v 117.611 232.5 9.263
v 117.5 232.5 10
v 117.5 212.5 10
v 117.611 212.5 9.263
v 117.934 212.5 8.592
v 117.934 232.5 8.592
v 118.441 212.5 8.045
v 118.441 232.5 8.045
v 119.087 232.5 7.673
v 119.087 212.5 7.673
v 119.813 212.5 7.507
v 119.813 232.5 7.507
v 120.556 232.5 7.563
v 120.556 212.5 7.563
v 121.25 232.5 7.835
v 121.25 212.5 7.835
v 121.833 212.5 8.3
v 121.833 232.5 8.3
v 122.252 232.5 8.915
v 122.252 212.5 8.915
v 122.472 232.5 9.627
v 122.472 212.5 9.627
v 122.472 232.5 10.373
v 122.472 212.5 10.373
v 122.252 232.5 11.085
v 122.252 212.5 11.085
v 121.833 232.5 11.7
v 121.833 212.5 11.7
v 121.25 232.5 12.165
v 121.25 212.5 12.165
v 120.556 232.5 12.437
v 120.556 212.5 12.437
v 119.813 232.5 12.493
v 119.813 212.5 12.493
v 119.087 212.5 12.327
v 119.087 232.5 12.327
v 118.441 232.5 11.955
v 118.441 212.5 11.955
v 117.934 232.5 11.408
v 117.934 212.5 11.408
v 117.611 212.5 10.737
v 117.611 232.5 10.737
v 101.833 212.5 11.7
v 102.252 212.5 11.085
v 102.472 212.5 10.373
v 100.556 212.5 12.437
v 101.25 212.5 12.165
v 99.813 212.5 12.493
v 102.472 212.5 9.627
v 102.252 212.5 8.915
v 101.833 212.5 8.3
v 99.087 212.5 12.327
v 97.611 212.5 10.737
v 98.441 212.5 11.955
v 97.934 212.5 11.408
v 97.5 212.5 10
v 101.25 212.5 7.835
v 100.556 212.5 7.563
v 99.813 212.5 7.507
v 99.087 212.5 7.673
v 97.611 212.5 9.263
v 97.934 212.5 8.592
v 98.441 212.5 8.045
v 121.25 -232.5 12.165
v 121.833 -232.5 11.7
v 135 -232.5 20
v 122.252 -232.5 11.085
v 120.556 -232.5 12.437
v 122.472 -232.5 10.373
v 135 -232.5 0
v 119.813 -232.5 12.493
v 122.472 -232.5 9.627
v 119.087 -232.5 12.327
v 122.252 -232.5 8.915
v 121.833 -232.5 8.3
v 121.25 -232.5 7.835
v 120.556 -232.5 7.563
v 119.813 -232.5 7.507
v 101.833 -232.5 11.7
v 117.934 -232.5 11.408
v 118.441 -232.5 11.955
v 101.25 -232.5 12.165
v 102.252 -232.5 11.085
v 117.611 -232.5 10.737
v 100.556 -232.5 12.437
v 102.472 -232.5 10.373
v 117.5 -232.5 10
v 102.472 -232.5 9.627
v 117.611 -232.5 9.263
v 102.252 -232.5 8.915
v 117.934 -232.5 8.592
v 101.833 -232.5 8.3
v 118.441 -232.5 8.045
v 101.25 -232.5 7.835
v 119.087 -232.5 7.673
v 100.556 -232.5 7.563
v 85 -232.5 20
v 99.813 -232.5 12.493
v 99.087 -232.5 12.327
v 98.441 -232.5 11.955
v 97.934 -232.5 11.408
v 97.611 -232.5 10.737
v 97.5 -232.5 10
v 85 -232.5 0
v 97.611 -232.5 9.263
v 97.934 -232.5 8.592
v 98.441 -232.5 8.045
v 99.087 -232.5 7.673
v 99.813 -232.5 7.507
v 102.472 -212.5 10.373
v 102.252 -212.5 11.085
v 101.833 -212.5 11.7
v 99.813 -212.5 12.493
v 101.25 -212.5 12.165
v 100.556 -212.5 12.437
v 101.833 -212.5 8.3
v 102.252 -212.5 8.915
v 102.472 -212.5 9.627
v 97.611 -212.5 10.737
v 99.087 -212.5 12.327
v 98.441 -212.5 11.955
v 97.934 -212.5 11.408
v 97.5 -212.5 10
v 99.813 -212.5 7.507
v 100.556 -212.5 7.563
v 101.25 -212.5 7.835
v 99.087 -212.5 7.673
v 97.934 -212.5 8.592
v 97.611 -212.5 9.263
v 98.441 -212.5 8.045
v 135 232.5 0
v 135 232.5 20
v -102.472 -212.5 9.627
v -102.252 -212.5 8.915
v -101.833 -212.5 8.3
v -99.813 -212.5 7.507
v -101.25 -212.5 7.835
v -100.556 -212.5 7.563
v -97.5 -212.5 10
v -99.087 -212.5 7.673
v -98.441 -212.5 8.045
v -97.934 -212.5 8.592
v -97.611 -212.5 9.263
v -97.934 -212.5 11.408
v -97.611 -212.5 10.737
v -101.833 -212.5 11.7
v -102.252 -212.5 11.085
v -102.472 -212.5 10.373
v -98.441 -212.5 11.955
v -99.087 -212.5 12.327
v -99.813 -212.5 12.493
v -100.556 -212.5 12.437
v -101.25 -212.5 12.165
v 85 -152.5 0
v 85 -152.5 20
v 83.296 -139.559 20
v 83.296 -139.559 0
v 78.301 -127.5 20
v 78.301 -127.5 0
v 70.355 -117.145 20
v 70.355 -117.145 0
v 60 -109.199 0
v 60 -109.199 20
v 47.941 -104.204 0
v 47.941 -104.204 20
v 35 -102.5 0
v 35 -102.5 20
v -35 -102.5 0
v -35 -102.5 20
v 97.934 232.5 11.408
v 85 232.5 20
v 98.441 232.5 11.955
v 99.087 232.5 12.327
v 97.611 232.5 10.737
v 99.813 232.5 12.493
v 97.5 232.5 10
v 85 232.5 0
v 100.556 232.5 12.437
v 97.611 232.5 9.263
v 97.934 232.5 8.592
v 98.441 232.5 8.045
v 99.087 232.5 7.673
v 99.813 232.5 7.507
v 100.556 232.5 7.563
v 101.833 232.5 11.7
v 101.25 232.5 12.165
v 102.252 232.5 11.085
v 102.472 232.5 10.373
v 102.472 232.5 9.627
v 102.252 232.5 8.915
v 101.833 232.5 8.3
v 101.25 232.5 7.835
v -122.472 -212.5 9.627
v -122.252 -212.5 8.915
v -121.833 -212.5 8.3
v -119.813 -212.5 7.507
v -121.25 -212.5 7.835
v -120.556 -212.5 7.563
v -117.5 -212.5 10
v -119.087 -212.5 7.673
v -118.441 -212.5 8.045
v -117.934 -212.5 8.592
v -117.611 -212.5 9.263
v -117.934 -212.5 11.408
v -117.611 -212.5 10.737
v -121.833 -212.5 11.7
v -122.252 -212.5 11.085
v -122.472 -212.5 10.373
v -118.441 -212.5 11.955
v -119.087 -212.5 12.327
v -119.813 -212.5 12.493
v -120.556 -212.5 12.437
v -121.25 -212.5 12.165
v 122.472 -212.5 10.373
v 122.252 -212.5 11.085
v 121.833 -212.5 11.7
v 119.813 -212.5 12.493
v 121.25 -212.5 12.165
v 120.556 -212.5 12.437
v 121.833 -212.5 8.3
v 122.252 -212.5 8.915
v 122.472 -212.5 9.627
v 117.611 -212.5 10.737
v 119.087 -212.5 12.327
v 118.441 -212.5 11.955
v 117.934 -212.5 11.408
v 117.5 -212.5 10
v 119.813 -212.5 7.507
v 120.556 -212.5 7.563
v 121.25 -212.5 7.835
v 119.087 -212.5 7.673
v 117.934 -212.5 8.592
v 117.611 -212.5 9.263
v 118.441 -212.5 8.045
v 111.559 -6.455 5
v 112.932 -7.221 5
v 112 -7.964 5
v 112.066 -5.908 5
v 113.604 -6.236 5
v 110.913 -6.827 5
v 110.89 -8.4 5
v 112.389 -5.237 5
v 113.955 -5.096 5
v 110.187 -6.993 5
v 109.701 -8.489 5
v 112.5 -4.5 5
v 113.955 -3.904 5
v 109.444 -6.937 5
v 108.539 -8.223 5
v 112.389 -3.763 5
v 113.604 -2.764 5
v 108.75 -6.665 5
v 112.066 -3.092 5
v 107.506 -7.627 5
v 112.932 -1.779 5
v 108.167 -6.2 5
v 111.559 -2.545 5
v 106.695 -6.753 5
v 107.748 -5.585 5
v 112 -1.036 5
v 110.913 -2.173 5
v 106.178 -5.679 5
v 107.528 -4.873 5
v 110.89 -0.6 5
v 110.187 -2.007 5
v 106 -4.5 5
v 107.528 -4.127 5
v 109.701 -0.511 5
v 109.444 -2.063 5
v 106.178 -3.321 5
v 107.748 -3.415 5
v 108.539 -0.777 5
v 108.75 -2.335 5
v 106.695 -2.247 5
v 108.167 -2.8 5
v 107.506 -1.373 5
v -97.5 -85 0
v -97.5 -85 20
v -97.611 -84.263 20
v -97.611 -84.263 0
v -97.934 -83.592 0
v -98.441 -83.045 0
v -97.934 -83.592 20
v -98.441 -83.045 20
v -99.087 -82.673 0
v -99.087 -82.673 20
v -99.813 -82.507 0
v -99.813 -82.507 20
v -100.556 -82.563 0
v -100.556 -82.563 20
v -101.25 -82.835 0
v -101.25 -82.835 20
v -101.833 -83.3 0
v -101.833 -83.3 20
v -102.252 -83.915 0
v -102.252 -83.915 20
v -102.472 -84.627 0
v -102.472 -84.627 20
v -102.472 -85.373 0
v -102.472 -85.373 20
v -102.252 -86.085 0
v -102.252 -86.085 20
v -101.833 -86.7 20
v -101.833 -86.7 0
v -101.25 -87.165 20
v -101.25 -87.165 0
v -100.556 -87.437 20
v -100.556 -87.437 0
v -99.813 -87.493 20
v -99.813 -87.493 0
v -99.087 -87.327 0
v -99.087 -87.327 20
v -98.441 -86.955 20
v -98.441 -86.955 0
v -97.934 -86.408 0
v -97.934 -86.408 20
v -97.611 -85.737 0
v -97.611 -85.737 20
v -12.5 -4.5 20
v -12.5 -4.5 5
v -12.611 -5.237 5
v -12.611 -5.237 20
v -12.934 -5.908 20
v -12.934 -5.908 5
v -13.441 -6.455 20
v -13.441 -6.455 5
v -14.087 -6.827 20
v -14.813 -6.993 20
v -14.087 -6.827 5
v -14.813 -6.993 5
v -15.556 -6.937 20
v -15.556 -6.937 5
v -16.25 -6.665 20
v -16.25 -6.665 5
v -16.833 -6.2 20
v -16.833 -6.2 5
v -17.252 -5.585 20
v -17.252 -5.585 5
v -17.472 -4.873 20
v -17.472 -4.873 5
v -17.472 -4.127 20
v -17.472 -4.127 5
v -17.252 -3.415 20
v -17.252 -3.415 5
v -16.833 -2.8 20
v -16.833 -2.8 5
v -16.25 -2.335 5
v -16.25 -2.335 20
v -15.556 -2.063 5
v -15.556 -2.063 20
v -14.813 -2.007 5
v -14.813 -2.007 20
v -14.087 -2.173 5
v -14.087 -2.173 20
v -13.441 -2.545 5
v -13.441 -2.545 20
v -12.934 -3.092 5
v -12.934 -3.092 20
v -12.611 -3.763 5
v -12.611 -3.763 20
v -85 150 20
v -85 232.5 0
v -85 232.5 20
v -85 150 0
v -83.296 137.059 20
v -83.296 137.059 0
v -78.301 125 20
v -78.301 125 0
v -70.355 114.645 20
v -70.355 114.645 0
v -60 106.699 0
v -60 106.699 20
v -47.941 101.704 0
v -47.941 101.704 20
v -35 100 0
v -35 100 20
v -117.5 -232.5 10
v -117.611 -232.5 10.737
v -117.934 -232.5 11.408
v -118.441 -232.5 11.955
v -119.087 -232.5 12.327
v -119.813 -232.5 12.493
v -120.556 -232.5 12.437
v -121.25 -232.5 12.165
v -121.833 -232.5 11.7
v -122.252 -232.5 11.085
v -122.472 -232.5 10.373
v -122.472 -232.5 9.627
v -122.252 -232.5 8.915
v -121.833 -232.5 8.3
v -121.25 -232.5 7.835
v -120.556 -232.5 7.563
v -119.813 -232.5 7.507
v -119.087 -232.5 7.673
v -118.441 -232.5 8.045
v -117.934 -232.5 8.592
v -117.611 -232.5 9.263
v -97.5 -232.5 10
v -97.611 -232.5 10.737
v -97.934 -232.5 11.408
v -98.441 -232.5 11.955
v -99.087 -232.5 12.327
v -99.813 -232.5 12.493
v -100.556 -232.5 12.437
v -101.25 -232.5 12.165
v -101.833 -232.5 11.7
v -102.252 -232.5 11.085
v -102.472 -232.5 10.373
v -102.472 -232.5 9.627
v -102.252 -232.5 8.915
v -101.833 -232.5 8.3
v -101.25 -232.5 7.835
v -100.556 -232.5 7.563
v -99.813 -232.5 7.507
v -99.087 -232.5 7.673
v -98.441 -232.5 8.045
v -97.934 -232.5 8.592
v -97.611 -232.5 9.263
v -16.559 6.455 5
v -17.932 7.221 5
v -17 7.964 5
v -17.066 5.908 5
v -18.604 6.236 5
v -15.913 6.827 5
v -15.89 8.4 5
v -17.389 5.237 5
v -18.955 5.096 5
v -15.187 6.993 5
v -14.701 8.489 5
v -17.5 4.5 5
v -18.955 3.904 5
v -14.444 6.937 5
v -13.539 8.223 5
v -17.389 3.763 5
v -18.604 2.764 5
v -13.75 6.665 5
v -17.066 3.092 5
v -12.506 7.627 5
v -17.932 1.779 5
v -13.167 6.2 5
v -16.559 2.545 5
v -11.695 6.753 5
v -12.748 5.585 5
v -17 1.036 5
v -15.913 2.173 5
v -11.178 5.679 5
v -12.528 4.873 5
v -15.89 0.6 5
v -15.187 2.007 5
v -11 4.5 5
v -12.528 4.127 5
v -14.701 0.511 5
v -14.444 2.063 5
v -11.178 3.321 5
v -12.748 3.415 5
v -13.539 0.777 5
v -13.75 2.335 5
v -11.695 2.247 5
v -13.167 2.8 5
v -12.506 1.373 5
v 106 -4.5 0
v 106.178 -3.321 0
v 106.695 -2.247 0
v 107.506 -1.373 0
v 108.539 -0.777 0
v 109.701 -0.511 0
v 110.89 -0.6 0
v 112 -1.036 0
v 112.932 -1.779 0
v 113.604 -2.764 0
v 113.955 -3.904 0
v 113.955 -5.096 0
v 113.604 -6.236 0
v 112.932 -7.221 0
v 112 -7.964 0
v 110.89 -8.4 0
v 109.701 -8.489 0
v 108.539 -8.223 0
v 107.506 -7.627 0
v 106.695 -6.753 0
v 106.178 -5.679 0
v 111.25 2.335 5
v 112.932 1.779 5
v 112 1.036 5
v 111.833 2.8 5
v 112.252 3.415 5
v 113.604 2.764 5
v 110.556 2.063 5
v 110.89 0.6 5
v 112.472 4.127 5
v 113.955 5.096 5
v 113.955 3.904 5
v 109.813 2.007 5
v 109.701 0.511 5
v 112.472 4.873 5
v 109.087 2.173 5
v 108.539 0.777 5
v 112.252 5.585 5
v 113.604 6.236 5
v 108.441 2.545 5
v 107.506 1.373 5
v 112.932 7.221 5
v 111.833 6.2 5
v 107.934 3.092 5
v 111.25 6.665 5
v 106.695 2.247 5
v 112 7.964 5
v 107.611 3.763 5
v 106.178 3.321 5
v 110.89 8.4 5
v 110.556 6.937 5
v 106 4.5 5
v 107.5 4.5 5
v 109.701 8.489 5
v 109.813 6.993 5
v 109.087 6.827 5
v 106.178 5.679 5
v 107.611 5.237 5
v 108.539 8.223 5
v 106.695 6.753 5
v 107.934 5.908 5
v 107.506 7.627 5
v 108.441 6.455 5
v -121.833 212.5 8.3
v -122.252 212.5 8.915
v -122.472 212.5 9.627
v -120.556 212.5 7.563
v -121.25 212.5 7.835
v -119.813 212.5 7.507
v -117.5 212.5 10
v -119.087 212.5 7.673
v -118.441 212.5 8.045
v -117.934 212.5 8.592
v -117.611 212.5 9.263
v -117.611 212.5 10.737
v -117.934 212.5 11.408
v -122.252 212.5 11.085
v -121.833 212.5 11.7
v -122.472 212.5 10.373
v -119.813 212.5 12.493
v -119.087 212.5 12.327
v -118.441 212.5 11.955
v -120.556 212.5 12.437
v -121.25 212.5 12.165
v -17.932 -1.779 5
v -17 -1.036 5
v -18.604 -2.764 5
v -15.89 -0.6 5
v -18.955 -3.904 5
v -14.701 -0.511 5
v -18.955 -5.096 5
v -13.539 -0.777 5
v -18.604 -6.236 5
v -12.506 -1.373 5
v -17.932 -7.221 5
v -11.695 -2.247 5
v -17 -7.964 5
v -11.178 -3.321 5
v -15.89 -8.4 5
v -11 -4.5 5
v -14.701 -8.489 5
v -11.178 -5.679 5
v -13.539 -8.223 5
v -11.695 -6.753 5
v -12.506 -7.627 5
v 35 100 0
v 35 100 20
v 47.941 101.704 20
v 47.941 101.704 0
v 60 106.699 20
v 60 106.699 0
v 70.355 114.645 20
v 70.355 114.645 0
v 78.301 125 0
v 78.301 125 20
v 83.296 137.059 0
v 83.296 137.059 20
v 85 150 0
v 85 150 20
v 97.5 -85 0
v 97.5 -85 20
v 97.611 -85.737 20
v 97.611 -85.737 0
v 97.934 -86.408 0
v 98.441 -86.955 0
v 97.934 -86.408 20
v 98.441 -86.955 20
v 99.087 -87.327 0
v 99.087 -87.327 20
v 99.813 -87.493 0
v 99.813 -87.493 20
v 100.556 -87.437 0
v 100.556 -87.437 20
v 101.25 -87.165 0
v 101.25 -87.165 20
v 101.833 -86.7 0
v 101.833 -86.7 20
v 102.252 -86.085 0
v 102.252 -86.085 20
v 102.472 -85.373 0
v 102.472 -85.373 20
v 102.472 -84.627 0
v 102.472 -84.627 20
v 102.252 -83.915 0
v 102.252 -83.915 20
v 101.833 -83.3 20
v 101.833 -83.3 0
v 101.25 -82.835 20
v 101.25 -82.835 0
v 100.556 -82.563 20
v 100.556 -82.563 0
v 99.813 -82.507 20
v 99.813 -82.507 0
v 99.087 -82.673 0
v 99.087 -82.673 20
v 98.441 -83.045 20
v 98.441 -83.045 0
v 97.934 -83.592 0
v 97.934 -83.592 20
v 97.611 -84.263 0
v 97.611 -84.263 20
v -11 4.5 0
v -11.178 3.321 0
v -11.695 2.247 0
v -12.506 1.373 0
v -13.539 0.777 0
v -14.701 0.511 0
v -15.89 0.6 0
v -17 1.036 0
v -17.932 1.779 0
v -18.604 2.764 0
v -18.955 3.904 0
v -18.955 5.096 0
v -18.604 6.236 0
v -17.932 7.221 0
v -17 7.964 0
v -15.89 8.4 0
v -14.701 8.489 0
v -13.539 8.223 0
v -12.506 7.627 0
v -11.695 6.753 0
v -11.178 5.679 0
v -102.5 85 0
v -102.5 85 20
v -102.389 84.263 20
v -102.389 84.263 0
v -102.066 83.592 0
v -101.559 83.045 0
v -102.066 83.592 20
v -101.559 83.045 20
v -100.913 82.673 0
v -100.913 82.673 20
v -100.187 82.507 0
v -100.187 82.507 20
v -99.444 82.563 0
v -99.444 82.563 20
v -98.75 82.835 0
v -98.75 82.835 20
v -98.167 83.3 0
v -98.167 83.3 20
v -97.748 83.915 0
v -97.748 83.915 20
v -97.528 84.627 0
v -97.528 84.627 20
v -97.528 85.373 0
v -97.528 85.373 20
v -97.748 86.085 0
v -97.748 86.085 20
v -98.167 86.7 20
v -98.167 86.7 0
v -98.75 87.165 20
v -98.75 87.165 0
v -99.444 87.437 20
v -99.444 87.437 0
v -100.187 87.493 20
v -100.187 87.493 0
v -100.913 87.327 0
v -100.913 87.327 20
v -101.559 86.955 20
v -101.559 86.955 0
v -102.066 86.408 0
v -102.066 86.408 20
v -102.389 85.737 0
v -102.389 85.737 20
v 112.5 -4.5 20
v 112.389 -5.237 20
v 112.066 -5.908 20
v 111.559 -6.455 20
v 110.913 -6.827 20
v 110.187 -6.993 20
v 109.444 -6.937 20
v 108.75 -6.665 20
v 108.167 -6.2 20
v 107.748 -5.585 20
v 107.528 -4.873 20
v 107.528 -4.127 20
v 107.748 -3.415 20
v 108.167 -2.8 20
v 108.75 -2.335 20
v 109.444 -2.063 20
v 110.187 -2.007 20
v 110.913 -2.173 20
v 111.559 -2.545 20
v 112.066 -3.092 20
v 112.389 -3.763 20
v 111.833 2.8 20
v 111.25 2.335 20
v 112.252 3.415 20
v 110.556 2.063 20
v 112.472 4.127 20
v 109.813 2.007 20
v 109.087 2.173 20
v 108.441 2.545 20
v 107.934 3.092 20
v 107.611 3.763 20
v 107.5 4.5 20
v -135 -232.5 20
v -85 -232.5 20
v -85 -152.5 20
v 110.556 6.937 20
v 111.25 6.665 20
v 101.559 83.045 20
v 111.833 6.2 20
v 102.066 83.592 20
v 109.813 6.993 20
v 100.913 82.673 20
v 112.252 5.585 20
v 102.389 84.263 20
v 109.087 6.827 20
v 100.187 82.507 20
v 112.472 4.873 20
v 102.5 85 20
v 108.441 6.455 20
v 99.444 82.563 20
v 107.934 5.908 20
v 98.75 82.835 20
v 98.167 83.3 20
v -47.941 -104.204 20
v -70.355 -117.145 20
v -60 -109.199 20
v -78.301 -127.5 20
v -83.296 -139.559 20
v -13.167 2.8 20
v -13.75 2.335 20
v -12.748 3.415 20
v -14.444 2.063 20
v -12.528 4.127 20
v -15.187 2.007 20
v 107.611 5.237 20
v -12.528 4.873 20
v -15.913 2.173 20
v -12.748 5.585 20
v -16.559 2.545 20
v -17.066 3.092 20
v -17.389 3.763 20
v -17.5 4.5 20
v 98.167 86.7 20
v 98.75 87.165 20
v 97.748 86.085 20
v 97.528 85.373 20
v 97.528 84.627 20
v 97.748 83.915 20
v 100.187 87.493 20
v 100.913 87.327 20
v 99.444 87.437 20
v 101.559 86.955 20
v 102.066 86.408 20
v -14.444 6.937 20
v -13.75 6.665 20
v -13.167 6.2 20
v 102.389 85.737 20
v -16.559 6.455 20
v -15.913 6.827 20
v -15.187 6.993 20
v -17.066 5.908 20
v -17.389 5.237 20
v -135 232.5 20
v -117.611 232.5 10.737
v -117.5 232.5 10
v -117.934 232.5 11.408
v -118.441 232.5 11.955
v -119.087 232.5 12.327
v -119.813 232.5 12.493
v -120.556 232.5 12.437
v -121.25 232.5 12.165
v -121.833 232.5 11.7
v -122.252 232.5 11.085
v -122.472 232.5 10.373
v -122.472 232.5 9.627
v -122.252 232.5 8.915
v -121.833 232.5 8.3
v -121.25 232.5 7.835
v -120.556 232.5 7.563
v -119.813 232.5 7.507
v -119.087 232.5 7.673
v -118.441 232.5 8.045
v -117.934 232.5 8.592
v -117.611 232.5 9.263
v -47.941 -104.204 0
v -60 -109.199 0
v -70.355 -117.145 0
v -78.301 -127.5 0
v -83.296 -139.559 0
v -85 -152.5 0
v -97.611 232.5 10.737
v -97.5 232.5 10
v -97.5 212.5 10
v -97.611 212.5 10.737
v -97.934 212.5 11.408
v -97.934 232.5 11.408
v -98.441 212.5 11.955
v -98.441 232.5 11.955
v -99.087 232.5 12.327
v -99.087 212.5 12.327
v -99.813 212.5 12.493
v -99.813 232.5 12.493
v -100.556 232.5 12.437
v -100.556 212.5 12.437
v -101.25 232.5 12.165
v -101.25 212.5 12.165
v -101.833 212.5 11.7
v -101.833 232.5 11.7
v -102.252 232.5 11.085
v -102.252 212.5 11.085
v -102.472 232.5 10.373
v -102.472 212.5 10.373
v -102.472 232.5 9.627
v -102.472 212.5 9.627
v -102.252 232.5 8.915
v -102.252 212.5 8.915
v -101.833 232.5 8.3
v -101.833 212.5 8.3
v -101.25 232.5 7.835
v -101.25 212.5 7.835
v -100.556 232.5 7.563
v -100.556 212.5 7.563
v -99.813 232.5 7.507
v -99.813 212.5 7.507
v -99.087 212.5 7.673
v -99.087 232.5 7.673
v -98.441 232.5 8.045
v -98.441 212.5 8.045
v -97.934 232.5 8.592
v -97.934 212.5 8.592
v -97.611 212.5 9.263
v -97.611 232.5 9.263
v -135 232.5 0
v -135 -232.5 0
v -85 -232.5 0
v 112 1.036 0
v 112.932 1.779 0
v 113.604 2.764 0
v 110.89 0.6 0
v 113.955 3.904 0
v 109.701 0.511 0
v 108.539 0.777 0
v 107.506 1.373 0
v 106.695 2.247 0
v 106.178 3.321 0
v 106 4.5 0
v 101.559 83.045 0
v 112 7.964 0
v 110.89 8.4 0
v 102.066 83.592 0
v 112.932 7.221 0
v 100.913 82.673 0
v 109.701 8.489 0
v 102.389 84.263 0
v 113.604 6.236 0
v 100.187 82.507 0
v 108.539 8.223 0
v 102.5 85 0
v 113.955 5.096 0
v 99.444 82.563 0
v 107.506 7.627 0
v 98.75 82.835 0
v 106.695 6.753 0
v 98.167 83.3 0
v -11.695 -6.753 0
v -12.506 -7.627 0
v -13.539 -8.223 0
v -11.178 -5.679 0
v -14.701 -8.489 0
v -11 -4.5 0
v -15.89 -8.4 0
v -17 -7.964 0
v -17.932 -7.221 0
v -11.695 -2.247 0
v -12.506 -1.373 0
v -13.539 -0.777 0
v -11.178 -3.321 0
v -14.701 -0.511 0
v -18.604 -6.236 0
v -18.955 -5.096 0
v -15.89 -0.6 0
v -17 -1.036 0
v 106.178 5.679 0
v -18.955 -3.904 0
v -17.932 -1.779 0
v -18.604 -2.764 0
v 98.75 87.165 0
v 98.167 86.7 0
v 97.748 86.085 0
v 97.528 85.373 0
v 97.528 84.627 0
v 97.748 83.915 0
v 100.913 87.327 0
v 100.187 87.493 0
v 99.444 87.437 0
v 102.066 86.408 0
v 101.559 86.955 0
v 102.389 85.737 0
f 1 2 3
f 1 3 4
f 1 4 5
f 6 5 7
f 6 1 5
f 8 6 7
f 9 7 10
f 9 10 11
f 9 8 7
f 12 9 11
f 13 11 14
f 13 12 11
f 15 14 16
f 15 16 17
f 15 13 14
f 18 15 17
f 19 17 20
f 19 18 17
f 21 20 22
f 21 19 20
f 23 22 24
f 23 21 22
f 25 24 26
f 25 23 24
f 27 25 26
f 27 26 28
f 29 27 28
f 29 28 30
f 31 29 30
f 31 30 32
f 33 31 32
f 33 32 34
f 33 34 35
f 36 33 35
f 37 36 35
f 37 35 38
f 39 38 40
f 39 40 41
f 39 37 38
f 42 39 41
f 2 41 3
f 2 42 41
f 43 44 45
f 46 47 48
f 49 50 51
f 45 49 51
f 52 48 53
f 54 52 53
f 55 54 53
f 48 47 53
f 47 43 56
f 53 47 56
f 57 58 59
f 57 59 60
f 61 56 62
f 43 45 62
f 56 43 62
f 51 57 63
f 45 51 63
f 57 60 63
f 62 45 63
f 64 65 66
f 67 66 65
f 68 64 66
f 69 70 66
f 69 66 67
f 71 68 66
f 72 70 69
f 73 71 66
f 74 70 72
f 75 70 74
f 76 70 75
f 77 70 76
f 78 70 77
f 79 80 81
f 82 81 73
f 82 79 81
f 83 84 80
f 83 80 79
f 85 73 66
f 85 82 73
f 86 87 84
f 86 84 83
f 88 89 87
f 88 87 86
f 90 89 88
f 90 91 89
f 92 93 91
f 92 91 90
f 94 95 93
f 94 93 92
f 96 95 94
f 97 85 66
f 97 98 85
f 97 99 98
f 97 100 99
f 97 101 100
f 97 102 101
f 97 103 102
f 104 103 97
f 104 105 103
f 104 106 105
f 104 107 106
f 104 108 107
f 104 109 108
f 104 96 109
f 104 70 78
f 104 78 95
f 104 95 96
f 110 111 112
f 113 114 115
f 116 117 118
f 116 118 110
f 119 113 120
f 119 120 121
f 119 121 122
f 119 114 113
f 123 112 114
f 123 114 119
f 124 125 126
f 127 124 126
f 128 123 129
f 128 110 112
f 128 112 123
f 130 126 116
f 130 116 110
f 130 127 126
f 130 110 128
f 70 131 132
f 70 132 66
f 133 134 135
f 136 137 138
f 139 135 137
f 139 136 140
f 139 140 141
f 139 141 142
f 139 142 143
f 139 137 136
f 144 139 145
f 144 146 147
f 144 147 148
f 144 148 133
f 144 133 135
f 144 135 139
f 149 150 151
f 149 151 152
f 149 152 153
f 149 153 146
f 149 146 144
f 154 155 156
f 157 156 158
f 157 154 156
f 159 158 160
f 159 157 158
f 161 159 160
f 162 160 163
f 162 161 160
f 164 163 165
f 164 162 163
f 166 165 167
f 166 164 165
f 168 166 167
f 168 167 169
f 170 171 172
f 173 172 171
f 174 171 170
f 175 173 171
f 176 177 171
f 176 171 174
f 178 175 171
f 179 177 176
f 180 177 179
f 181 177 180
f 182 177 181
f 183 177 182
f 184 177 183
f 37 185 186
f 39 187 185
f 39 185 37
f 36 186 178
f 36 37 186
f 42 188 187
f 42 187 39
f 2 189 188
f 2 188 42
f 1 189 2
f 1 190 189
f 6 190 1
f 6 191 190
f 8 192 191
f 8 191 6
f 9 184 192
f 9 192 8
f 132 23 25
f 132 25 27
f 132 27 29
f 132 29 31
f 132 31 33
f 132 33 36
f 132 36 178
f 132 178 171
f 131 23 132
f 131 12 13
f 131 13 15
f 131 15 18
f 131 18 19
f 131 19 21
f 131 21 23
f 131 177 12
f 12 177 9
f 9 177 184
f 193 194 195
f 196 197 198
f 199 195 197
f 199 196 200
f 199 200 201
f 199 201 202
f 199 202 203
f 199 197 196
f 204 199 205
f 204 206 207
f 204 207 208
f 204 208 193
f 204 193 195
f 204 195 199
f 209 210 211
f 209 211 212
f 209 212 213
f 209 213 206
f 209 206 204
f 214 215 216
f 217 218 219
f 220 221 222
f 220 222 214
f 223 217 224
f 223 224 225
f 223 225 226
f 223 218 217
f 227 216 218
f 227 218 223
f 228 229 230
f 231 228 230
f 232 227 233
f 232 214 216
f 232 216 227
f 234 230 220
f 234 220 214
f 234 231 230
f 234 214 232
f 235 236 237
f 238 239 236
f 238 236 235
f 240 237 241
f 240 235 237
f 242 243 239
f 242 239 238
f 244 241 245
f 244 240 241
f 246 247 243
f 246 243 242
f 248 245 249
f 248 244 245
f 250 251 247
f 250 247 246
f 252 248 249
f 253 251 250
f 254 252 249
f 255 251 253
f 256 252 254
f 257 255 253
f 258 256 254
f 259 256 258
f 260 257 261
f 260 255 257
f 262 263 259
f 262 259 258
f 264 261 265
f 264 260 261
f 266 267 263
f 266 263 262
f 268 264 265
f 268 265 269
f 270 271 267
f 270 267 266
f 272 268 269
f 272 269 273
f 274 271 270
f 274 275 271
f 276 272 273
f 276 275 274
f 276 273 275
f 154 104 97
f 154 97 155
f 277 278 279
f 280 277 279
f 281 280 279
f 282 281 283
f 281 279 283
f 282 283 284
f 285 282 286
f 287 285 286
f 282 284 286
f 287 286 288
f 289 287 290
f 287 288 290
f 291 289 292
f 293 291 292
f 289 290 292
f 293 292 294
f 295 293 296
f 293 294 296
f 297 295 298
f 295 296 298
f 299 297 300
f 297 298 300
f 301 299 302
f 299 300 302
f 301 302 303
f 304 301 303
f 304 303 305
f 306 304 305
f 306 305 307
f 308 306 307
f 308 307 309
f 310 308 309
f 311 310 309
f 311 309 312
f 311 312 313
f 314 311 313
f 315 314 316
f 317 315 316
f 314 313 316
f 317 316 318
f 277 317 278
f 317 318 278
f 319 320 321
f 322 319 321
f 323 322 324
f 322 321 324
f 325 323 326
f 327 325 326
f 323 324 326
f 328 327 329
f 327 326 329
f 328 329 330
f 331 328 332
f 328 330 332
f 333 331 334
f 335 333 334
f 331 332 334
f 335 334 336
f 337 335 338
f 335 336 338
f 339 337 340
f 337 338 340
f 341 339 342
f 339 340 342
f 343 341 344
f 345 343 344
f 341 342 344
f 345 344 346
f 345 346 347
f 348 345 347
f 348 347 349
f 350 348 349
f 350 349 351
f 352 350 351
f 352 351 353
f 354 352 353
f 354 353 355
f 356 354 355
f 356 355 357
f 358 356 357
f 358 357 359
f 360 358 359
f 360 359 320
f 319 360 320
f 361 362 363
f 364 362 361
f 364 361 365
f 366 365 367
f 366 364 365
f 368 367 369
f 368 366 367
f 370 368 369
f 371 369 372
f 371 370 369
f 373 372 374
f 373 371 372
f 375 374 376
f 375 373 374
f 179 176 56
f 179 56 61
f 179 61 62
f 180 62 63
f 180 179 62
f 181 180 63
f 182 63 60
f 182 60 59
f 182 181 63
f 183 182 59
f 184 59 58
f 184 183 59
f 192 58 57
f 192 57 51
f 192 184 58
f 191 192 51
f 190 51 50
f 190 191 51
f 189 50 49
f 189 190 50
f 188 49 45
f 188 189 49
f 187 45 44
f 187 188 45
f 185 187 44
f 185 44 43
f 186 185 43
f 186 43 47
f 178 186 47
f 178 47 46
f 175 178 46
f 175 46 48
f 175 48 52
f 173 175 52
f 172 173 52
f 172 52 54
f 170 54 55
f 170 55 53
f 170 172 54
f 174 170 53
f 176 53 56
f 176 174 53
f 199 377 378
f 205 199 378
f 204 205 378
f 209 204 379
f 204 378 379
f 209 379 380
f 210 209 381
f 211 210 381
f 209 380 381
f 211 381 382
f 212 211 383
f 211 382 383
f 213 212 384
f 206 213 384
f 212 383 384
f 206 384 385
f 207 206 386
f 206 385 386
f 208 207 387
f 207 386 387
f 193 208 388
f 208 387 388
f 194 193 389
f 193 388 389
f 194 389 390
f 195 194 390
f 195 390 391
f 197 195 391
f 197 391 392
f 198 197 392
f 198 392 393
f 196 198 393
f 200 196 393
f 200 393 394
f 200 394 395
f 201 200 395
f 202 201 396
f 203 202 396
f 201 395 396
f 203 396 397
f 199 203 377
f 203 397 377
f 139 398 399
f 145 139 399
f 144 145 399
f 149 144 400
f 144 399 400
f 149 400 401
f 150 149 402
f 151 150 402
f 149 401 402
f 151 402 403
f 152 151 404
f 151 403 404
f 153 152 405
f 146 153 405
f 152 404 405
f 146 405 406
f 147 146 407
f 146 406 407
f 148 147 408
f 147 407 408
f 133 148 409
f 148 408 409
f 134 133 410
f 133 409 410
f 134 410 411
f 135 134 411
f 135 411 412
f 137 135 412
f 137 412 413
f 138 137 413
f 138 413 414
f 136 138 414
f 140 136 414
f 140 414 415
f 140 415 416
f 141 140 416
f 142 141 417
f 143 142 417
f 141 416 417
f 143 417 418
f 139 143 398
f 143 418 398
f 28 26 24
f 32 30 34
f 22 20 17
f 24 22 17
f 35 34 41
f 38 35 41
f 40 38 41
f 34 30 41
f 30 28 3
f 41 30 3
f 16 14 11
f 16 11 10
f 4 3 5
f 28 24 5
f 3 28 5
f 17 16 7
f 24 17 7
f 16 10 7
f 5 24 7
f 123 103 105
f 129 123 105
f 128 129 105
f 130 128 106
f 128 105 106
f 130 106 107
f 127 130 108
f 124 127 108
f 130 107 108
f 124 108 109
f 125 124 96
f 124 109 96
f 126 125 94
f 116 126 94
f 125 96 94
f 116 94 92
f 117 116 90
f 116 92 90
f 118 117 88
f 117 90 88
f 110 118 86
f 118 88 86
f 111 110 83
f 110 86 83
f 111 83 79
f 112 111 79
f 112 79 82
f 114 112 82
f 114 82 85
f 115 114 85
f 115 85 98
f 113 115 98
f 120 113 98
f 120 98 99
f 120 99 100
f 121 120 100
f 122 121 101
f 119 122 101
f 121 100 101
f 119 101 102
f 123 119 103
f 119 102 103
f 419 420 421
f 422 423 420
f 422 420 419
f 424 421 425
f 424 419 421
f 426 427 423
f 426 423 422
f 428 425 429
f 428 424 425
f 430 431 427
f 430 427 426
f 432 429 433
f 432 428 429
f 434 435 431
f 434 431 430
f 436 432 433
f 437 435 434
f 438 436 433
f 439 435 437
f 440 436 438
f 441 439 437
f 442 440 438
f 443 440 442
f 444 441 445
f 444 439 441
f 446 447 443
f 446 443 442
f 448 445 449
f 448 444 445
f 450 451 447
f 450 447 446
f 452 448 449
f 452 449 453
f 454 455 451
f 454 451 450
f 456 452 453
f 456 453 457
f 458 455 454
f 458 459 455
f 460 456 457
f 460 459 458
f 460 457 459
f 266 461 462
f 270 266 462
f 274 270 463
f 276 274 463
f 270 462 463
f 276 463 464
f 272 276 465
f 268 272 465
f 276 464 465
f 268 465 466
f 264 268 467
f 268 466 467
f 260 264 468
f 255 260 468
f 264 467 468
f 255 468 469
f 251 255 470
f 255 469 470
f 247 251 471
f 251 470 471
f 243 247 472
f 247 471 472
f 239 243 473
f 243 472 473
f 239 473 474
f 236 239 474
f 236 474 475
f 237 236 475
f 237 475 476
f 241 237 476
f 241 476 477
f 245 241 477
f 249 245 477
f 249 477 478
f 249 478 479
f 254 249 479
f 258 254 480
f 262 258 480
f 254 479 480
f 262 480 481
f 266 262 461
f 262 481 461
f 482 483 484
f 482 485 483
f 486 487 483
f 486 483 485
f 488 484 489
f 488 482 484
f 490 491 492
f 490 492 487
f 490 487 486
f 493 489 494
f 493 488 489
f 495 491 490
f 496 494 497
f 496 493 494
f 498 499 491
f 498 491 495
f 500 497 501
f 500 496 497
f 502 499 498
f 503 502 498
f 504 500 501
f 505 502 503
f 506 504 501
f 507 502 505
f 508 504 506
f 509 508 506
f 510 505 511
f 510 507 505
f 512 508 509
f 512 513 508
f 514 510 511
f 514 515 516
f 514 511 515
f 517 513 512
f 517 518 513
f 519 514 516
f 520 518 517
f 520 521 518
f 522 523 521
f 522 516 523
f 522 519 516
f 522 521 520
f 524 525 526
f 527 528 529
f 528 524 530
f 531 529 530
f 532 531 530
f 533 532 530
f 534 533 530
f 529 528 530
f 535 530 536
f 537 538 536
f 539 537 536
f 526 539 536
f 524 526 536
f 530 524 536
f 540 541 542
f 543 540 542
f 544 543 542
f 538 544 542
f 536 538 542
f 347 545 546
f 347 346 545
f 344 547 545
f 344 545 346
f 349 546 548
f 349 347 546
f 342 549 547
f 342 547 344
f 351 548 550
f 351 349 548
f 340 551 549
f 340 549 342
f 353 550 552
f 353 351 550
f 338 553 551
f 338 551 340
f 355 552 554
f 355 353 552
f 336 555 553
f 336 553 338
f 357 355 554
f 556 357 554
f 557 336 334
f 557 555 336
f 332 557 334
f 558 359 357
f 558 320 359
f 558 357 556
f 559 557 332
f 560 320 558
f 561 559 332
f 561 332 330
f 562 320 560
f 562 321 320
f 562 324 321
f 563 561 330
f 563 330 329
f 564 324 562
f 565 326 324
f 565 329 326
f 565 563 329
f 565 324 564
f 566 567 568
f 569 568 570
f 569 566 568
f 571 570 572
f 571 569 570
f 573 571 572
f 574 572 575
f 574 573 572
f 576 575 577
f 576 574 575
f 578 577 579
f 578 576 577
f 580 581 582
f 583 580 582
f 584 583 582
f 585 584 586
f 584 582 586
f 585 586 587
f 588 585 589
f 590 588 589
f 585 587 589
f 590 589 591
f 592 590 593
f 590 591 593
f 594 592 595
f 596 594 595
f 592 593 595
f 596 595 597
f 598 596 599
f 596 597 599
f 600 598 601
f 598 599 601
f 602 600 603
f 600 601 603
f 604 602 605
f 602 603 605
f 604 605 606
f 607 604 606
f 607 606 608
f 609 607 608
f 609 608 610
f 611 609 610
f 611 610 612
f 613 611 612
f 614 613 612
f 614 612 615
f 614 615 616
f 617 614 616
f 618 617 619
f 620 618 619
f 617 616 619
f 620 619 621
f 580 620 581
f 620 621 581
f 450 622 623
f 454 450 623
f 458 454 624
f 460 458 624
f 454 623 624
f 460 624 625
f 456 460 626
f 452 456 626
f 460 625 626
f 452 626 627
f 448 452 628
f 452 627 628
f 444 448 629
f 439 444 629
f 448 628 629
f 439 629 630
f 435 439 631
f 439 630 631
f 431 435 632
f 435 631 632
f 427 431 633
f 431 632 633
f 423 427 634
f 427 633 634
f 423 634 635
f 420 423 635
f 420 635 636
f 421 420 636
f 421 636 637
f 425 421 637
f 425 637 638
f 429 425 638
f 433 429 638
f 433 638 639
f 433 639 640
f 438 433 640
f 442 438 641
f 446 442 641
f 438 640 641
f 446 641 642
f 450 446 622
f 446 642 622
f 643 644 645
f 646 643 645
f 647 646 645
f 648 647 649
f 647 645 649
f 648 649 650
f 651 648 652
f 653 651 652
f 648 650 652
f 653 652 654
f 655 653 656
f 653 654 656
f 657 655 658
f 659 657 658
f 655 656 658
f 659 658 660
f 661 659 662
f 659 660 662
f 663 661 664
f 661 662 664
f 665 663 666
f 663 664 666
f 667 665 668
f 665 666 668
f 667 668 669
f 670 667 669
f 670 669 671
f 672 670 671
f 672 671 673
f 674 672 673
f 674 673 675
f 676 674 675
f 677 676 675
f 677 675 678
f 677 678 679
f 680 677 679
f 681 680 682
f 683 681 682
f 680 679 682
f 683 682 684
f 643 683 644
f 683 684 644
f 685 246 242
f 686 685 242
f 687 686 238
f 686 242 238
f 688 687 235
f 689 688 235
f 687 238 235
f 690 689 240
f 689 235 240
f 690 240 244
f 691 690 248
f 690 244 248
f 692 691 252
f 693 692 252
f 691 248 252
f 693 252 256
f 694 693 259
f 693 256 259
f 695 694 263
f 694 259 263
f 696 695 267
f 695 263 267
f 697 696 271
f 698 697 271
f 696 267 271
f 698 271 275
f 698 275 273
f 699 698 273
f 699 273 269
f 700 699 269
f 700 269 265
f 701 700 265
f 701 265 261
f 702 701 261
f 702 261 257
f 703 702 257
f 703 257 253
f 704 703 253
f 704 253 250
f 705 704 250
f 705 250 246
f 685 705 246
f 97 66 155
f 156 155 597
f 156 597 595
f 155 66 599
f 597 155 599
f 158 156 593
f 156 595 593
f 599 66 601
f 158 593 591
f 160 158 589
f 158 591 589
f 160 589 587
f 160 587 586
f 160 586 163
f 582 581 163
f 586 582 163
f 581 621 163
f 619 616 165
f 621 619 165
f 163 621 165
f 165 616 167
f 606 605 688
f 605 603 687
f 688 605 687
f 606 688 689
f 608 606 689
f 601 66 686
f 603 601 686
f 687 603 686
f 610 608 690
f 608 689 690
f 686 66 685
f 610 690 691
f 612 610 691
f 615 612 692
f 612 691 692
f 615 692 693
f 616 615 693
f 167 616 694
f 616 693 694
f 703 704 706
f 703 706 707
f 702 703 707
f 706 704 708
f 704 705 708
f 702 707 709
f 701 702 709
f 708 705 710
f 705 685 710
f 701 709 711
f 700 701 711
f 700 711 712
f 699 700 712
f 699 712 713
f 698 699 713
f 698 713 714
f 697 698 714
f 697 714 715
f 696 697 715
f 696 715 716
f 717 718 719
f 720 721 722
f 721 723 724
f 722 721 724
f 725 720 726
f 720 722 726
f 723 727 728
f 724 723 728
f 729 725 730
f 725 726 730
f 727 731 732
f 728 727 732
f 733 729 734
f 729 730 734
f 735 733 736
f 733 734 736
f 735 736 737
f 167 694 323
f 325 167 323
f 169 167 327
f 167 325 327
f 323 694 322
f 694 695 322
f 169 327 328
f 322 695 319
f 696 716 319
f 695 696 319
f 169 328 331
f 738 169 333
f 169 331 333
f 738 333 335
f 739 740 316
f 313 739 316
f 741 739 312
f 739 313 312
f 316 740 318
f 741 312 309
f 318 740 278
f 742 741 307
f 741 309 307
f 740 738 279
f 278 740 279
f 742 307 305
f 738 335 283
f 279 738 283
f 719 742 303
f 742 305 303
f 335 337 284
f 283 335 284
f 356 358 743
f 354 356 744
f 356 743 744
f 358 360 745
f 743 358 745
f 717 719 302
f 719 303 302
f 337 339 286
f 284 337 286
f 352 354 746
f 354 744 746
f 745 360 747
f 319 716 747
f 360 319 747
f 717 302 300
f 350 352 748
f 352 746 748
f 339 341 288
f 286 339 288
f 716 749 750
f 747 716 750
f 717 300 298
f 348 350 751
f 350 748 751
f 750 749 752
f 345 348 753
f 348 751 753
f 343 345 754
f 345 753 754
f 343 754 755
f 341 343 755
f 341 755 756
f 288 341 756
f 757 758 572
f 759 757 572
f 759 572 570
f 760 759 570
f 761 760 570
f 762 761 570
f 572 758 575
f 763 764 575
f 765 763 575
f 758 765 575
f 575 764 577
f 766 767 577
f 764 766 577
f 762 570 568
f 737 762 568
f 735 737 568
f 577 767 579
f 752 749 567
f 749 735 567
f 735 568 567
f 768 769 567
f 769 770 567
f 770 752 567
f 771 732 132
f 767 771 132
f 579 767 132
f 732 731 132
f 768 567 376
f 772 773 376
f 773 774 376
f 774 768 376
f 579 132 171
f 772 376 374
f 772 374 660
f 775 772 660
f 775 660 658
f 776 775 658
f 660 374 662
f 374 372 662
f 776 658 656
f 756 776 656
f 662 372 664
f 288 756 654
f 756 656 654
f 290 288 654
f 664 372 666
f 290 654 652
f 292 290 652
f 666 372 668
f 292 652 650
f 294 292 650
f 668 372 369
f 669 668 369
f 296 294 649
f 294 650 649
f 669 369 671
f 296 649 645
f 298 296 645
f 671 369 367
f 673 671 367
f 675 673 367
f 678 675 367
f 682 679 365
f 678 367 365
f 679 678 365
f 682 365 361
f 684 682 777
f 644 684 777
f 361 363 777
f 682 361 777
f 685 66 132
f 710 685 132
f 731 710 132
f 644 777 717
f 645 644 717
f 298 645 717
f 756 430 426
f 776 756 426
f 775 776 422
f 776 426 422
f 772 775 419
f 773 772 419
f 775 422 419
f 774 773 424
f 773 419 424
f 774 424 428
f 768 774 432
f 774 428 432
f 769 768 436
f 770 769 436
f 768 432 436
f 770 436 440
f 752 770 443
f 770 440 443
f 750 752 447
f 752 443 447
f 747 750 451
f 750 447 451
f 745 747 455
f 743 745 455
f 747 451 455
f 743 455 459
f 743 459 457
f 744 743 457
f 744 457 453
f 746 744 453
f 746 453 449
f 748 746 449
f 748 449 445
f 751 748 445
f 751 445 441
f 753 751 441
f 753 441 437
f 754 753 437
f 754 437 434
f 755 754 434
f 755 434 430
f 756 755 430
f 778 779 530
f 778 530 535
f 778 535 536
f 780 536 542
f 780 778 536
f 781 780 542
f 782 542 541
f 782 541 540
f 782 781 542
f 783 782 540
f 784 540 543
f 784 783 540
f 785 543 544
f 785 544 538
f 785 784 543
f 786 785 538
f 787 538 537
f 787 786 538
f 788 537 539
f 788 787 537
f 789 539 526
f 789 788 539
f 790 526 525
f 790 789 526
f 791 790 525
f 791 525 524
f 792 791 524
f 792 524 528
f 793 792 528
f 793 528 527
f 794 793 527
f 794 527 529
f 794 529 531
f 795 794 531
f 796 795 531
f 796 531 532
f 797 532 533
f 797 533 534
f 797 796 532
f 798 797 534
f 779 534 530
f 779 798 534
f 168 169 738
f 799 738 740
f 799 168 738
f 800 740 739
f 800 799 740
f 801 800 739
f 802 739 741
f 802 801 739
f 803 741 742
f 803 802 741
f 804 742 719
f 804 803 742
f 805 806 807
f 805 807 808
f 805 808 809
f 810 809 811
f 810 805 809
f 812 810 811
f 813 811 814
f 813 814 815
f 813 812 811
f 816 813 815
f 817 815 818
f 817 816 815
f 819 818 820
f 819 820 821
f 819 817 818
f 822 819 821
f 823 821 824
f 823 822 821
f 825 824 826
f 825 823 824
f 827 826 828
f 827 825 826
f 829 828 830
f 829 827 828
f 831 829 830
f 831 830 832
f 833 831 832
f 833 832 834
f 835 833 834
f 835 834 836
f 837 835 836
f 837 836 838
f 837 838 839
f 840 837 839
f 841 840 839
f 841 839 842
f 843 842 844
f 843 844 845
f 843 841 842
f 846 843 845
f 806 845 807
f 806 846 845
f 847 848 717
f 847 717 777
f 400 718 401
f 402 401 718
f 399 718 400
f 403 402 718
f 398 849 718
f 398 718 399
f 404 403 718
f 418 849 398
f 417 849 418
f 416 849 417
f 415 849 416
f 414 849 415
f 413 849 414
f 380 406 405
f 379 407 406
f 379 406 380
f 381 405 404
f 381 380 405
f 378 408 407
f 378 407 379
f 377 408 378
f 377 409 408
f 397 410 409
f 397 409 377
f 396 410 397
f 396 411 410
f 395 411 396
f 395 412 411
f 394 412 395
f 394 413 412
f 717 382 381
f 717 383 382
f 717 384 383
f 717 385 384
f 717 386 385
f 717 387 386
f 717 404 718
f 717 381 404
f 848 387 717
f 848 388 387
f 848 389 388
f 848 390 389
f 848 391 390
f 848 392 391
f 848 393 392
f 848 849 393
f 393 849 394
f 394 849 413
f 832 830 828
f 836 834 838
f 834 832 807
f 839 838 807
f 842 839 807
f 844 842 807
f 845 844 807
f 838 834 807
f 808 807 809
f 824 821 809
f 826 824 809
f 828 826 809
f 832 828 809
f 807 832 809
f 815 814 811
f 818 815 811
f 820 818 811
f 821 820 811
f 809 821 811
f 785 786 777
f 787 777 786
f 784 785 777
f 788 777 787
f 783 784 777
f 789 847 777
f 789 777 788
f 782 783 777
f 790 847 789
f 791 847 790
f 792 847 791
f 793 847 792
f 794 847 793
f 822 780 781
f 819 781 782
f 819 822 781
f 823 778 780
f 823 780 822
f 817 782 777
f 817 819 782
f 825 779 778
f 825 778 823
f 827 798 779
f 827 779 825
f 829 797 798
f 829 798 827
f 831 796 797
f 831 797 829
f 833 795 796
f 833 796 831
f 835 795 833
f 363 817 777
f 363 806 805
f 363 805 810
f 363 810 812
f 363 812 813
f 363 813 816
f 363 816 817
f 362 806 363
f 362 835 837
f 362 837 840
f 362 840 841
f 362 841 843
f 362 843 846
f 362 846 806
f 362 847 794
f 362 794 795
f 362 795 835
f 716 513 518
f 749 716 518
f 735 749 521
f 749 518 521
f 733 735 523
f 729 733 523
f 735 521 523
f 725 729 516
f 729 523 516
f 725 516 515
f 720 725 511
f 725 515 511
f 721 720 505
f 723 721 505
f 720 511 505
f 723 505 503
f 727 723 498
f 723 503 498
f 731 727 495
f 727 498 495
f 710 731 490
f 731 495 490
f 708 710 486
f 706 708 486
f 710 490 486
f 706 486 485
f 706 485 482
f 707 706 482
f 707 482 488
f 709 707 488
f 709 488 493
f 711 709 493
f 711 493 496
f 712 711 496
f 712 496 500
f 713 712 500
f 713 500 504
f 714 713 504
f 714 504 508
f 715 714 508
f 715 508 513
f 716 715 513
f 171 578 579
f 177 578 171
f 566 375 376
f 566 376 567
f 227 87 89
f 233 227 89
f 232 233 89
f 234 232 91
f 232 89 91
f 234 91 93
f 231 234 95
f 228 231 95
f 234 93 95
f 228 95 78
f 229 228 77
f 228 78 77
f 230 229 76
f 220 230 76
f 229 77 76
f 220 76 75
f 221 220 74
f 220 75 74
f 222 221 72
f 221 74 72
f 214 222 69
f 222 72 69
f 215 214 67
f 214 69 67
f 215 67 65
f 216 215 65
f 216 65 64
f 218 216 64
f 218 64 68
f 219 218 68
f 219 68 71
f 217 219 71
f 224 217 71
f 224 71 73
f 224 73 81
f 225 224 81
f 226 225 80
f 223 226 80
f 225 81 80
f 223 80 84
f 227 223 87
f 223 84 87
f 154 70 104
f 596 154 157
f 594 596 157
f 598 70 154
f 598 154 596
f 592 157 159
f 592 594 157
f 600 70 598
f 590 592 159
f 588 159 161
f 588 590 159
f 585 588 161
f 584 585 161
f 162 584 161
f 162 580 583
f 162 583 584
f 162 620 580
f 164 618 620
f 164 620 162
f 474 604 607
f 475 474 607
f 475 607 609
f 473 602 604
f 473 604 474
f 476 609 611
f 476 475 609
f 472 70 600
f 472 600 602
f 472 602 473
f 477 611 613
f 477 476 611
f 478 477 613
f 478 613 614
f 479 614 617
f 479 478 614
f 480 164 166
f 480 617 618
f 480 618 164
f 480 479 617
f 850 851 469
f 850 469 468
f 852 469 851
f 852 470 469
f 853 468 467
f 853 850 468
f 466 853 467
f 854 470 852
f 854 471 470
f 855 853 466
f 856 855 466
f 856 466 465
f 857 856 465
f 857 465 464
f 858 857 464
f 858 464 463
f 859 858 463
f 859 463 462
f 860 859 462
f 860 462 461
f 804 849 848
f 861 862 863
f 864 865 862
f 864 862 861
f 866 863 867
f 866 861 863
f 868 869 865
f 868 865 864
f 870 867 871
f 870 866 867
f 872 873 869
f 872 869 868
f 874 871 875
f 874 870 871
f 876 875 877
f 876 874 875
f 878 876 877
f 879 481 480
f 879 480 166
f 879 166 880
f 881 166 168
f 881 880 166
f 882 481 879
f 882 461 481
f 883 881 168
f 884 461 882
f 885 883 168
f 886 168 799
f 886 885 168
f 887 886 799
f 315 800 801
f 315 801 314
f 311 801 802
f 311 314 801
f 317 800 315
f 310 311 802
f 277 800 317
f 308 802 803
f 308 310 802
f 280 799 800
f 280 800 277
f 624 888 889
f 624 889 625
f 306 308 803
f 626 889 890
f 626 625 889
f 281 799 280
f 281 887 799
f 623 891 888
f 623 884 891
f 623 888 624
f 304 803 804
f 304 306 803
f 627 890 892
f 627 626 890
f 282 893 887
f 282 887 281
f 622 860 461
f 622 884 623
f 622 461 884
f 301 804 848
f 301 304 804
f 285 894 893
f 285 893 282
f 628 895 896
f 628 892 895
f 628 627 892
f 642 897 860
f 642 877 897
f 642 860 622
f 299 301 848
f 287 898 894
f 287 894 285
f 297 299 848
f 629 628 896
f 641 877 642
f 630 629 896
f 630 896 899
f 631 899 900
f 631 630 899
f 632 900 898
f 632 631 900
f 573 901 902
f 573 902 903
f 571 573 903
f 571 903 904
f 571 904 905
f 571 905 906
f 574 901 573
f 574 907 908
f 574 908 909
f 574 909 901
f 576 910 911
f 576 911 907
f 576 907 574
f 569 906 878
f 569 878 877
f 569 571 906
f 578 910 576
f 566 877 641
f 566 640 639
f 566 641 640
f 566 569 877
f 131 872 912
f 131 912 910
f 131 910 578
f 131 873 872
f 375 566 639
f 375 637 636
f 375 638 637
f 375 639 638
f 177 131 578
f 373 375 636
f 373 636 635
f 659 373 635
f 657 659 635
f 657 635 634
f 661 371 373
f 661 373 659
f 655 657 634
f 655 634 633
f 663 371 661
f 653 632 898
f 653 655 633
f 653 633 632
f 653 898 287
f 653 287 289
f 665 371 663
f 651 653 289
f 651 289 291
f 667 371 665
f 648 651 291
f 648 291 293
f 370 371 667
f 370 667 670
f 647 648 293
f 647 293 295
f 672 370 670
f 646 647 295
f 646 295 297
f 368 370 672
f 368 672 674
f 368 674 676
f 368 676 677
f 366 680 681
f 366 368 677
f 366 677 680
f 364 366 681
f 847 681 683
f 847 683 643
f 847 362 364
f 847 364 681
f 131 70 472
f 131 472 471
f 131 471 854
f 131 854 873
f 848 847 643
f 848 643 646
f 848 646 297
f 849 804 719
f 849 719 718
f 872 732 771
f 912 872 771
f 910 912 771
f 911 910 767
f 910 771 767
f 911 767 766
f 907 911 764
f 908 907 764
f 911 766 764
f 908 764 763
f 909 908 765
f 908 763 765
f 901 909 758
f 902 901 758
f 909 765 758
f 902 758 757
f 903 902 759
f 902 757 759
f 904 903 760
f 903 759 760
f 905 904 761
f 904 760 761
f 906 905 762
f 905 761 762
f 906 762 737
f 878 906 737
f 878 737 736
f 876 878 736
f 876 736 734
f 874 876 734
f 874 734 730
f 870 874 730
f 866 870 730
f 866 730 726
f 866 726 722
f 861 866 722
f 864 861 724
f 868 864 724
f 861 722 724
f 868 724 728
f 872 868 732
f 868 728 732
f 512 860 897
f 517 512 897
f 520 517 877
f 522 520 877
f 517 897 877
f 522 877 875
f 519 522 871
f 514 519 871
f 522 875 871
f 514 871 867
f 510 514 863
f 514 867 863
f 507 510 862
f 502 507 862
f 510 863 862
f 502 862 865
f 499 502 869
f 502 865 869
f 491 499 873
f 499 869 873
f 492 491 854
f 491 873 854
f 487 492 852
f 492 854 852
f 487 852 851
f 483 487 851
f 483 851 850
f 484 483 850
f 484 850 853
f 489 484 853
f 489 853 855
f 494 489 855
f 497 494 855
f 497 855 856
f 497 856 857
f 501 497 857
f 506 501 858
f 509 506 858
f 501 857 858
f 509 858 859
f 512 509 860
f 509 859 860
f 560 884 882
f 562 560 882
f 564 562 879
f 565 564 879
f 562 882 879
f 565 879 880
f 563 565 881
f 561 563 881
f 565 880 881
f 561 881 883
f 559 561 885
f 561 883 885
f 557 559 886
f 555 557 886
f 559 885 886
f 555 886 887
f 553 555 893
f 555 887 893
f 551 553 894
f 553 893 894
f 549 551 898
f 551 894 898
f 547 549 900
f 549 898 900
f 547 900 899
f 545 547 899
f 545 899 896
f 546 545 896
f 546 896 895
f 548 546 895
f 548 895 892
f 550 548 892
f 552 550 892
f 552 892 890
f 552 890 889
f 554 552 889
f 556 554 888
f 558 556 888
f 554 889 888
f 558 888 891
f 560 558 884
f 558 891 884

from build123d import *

# Parameters (mm, degrees)
BOSS_EXTRUDE1_DEPTH = 20
SKETCH2_R           = 2.5
CUT_EXTRUDE1_DEPTH  = 20
SKETCH3_R           = 2.5
CUT_EXTRUDE2_DEPTH  = 20
SKETCH4_R           = 2.5
CUT_EXTRUDE3_DEPTH  = 20
SKETCH5_R           = 4
CUT_EXTRUDE4_DEPTH  = 5


with BuildPart() as part:
    # Sketch1 → Boss-Extrude1 (new body)
    with BuildSketch(Plane.XY):
        with BuildLine():
            Line((85, 232.5), (135, 232.5))
            Line((135, 232.5), (135, -232.5))
            Line((135, -232.5), (85, -232.5))
            Line((85, -232.5), (85, -152.5))
            ThreePointArc((85, -152.5), (70.355339059, -117.144660941), (35, -102.5))
            Line((35, -102.5), (-35, -102.5))
            ThreePointArc((-35, -102.5), (-70.355339059, -117.144660941), (-85, -152.5))
            Line((-85, -152.5), (-85, -232.5))
            Line((-85, -232.5), (-135, -232.5))
            Line((-135, -232.5), (-135, 232.5))
            Line((-135, 232.5), (-85, 232.5))
            Line((-85, 232.5), (-85, 150))
            ThreePointArc((-85, 150), (-70.355339059, 114.644660941), (-35, 100))
            Line((-35, 100), (35, 100))
            ThreePointArc((35, 100), (70.355339059, 114.644660941), (85, 150))
            Line((85, 150), (85, 232.5))
        make_face()
    extrude(amount=BOSS_EXTRUDE1_DEPTH)

    # Sketch2 → Cut-Extrude1 (cut)
    with BuildSketch(Plane.XZ.offset(232.5)):
        with Locations((-120, 10)):
            Circle(SKETCH2_R)
        with Locations((-100, 10)):
            Circle(SKETCH2_R)
        with Locations(Location((100, 10, 0), (0, 0, 180))):
            Circle(SKETCH2_R)
        with Locations(Location((120, 10, 0), (0, 0, 180))):
            Circle(SKETCH2_R)
    cut_extrude1 = extrude(amount=-CUT_EXTRUDE1_DEPTH, mode=Mode.SUBTRACT)

    # Mirror1: Cut-Extrude1 across plane
    add(cut_extrude1.mirror(Plane.ZX), mode=Mode.SUBTRACT)

    # Sketch3 → Cut-Extrude2 (cut)
    with BuildSketch(Plane.XY.offset(20)):
        with Locations((100, 85)):
            Circle(SKETCH3_R)
        with Locations(Location((100, -85, 0), (0, 0, 180))):
            Circle(SKETCH3_R)
        with Locations(Location((-100, 85, 0), (0, 0, 180))):
            Circle(SKETCH3_R)
        with Locations((-100, -85)):
            Circle(SKETCH3_R)
    extrude(amount=-CUT_EXTRUDE2_DEPTH, mode=Mode.SUBTRACT)

    # Sketch4 → Cut-Extrude3 (cut)
    with BuildSketch(Plane(origin=(0, 0, 0), x_dir=(-1, 0, 0), z_dir=(0, 0, -1))):
        with Locations((-110, 4.5)):
            Circle(SKETCH4_R)
        with Locations(Location((-110, -4.5, 0), (0, 0, 180))):
            Circle(SKETCH4_R)
        with Locations((15, 4.5)):
            Circle(SKETCH4_R)
        with Locations(Location((15, -4.5, 0), (0, 0, 180))):
            Circle(SKETCH4_R)
    extrude(amount=-CUT_EXTRUDE3_DEPTH, mode=Mode.SUBTRACT)

    # Sketch5 → Cut-Extrude4 (cut)
    with BuildSketch(Plane(origin=(0, 0, 0), x_dir=(-1, 0, 0), z_dir=(0, 0, -1))):
        with Locations((-110, 4.5)):
            Circle(SKETCH5_R)
        with Locations((-110, -4.5)):
            Circle(SKETCH5_R)
        with Locations(Location((15, 4.5, 0), (0, 0, 180))):
            Circle(SKETCH5_R)
        with Locations(Location((15, -4.5, 0), (0, 0, 180))):
            Circle(SKETCH5_R)
    extrude(amount=-CUT_EXTRUDE4_DEPTH, mode=Mode.SUBTRACT)


solid = part.part
